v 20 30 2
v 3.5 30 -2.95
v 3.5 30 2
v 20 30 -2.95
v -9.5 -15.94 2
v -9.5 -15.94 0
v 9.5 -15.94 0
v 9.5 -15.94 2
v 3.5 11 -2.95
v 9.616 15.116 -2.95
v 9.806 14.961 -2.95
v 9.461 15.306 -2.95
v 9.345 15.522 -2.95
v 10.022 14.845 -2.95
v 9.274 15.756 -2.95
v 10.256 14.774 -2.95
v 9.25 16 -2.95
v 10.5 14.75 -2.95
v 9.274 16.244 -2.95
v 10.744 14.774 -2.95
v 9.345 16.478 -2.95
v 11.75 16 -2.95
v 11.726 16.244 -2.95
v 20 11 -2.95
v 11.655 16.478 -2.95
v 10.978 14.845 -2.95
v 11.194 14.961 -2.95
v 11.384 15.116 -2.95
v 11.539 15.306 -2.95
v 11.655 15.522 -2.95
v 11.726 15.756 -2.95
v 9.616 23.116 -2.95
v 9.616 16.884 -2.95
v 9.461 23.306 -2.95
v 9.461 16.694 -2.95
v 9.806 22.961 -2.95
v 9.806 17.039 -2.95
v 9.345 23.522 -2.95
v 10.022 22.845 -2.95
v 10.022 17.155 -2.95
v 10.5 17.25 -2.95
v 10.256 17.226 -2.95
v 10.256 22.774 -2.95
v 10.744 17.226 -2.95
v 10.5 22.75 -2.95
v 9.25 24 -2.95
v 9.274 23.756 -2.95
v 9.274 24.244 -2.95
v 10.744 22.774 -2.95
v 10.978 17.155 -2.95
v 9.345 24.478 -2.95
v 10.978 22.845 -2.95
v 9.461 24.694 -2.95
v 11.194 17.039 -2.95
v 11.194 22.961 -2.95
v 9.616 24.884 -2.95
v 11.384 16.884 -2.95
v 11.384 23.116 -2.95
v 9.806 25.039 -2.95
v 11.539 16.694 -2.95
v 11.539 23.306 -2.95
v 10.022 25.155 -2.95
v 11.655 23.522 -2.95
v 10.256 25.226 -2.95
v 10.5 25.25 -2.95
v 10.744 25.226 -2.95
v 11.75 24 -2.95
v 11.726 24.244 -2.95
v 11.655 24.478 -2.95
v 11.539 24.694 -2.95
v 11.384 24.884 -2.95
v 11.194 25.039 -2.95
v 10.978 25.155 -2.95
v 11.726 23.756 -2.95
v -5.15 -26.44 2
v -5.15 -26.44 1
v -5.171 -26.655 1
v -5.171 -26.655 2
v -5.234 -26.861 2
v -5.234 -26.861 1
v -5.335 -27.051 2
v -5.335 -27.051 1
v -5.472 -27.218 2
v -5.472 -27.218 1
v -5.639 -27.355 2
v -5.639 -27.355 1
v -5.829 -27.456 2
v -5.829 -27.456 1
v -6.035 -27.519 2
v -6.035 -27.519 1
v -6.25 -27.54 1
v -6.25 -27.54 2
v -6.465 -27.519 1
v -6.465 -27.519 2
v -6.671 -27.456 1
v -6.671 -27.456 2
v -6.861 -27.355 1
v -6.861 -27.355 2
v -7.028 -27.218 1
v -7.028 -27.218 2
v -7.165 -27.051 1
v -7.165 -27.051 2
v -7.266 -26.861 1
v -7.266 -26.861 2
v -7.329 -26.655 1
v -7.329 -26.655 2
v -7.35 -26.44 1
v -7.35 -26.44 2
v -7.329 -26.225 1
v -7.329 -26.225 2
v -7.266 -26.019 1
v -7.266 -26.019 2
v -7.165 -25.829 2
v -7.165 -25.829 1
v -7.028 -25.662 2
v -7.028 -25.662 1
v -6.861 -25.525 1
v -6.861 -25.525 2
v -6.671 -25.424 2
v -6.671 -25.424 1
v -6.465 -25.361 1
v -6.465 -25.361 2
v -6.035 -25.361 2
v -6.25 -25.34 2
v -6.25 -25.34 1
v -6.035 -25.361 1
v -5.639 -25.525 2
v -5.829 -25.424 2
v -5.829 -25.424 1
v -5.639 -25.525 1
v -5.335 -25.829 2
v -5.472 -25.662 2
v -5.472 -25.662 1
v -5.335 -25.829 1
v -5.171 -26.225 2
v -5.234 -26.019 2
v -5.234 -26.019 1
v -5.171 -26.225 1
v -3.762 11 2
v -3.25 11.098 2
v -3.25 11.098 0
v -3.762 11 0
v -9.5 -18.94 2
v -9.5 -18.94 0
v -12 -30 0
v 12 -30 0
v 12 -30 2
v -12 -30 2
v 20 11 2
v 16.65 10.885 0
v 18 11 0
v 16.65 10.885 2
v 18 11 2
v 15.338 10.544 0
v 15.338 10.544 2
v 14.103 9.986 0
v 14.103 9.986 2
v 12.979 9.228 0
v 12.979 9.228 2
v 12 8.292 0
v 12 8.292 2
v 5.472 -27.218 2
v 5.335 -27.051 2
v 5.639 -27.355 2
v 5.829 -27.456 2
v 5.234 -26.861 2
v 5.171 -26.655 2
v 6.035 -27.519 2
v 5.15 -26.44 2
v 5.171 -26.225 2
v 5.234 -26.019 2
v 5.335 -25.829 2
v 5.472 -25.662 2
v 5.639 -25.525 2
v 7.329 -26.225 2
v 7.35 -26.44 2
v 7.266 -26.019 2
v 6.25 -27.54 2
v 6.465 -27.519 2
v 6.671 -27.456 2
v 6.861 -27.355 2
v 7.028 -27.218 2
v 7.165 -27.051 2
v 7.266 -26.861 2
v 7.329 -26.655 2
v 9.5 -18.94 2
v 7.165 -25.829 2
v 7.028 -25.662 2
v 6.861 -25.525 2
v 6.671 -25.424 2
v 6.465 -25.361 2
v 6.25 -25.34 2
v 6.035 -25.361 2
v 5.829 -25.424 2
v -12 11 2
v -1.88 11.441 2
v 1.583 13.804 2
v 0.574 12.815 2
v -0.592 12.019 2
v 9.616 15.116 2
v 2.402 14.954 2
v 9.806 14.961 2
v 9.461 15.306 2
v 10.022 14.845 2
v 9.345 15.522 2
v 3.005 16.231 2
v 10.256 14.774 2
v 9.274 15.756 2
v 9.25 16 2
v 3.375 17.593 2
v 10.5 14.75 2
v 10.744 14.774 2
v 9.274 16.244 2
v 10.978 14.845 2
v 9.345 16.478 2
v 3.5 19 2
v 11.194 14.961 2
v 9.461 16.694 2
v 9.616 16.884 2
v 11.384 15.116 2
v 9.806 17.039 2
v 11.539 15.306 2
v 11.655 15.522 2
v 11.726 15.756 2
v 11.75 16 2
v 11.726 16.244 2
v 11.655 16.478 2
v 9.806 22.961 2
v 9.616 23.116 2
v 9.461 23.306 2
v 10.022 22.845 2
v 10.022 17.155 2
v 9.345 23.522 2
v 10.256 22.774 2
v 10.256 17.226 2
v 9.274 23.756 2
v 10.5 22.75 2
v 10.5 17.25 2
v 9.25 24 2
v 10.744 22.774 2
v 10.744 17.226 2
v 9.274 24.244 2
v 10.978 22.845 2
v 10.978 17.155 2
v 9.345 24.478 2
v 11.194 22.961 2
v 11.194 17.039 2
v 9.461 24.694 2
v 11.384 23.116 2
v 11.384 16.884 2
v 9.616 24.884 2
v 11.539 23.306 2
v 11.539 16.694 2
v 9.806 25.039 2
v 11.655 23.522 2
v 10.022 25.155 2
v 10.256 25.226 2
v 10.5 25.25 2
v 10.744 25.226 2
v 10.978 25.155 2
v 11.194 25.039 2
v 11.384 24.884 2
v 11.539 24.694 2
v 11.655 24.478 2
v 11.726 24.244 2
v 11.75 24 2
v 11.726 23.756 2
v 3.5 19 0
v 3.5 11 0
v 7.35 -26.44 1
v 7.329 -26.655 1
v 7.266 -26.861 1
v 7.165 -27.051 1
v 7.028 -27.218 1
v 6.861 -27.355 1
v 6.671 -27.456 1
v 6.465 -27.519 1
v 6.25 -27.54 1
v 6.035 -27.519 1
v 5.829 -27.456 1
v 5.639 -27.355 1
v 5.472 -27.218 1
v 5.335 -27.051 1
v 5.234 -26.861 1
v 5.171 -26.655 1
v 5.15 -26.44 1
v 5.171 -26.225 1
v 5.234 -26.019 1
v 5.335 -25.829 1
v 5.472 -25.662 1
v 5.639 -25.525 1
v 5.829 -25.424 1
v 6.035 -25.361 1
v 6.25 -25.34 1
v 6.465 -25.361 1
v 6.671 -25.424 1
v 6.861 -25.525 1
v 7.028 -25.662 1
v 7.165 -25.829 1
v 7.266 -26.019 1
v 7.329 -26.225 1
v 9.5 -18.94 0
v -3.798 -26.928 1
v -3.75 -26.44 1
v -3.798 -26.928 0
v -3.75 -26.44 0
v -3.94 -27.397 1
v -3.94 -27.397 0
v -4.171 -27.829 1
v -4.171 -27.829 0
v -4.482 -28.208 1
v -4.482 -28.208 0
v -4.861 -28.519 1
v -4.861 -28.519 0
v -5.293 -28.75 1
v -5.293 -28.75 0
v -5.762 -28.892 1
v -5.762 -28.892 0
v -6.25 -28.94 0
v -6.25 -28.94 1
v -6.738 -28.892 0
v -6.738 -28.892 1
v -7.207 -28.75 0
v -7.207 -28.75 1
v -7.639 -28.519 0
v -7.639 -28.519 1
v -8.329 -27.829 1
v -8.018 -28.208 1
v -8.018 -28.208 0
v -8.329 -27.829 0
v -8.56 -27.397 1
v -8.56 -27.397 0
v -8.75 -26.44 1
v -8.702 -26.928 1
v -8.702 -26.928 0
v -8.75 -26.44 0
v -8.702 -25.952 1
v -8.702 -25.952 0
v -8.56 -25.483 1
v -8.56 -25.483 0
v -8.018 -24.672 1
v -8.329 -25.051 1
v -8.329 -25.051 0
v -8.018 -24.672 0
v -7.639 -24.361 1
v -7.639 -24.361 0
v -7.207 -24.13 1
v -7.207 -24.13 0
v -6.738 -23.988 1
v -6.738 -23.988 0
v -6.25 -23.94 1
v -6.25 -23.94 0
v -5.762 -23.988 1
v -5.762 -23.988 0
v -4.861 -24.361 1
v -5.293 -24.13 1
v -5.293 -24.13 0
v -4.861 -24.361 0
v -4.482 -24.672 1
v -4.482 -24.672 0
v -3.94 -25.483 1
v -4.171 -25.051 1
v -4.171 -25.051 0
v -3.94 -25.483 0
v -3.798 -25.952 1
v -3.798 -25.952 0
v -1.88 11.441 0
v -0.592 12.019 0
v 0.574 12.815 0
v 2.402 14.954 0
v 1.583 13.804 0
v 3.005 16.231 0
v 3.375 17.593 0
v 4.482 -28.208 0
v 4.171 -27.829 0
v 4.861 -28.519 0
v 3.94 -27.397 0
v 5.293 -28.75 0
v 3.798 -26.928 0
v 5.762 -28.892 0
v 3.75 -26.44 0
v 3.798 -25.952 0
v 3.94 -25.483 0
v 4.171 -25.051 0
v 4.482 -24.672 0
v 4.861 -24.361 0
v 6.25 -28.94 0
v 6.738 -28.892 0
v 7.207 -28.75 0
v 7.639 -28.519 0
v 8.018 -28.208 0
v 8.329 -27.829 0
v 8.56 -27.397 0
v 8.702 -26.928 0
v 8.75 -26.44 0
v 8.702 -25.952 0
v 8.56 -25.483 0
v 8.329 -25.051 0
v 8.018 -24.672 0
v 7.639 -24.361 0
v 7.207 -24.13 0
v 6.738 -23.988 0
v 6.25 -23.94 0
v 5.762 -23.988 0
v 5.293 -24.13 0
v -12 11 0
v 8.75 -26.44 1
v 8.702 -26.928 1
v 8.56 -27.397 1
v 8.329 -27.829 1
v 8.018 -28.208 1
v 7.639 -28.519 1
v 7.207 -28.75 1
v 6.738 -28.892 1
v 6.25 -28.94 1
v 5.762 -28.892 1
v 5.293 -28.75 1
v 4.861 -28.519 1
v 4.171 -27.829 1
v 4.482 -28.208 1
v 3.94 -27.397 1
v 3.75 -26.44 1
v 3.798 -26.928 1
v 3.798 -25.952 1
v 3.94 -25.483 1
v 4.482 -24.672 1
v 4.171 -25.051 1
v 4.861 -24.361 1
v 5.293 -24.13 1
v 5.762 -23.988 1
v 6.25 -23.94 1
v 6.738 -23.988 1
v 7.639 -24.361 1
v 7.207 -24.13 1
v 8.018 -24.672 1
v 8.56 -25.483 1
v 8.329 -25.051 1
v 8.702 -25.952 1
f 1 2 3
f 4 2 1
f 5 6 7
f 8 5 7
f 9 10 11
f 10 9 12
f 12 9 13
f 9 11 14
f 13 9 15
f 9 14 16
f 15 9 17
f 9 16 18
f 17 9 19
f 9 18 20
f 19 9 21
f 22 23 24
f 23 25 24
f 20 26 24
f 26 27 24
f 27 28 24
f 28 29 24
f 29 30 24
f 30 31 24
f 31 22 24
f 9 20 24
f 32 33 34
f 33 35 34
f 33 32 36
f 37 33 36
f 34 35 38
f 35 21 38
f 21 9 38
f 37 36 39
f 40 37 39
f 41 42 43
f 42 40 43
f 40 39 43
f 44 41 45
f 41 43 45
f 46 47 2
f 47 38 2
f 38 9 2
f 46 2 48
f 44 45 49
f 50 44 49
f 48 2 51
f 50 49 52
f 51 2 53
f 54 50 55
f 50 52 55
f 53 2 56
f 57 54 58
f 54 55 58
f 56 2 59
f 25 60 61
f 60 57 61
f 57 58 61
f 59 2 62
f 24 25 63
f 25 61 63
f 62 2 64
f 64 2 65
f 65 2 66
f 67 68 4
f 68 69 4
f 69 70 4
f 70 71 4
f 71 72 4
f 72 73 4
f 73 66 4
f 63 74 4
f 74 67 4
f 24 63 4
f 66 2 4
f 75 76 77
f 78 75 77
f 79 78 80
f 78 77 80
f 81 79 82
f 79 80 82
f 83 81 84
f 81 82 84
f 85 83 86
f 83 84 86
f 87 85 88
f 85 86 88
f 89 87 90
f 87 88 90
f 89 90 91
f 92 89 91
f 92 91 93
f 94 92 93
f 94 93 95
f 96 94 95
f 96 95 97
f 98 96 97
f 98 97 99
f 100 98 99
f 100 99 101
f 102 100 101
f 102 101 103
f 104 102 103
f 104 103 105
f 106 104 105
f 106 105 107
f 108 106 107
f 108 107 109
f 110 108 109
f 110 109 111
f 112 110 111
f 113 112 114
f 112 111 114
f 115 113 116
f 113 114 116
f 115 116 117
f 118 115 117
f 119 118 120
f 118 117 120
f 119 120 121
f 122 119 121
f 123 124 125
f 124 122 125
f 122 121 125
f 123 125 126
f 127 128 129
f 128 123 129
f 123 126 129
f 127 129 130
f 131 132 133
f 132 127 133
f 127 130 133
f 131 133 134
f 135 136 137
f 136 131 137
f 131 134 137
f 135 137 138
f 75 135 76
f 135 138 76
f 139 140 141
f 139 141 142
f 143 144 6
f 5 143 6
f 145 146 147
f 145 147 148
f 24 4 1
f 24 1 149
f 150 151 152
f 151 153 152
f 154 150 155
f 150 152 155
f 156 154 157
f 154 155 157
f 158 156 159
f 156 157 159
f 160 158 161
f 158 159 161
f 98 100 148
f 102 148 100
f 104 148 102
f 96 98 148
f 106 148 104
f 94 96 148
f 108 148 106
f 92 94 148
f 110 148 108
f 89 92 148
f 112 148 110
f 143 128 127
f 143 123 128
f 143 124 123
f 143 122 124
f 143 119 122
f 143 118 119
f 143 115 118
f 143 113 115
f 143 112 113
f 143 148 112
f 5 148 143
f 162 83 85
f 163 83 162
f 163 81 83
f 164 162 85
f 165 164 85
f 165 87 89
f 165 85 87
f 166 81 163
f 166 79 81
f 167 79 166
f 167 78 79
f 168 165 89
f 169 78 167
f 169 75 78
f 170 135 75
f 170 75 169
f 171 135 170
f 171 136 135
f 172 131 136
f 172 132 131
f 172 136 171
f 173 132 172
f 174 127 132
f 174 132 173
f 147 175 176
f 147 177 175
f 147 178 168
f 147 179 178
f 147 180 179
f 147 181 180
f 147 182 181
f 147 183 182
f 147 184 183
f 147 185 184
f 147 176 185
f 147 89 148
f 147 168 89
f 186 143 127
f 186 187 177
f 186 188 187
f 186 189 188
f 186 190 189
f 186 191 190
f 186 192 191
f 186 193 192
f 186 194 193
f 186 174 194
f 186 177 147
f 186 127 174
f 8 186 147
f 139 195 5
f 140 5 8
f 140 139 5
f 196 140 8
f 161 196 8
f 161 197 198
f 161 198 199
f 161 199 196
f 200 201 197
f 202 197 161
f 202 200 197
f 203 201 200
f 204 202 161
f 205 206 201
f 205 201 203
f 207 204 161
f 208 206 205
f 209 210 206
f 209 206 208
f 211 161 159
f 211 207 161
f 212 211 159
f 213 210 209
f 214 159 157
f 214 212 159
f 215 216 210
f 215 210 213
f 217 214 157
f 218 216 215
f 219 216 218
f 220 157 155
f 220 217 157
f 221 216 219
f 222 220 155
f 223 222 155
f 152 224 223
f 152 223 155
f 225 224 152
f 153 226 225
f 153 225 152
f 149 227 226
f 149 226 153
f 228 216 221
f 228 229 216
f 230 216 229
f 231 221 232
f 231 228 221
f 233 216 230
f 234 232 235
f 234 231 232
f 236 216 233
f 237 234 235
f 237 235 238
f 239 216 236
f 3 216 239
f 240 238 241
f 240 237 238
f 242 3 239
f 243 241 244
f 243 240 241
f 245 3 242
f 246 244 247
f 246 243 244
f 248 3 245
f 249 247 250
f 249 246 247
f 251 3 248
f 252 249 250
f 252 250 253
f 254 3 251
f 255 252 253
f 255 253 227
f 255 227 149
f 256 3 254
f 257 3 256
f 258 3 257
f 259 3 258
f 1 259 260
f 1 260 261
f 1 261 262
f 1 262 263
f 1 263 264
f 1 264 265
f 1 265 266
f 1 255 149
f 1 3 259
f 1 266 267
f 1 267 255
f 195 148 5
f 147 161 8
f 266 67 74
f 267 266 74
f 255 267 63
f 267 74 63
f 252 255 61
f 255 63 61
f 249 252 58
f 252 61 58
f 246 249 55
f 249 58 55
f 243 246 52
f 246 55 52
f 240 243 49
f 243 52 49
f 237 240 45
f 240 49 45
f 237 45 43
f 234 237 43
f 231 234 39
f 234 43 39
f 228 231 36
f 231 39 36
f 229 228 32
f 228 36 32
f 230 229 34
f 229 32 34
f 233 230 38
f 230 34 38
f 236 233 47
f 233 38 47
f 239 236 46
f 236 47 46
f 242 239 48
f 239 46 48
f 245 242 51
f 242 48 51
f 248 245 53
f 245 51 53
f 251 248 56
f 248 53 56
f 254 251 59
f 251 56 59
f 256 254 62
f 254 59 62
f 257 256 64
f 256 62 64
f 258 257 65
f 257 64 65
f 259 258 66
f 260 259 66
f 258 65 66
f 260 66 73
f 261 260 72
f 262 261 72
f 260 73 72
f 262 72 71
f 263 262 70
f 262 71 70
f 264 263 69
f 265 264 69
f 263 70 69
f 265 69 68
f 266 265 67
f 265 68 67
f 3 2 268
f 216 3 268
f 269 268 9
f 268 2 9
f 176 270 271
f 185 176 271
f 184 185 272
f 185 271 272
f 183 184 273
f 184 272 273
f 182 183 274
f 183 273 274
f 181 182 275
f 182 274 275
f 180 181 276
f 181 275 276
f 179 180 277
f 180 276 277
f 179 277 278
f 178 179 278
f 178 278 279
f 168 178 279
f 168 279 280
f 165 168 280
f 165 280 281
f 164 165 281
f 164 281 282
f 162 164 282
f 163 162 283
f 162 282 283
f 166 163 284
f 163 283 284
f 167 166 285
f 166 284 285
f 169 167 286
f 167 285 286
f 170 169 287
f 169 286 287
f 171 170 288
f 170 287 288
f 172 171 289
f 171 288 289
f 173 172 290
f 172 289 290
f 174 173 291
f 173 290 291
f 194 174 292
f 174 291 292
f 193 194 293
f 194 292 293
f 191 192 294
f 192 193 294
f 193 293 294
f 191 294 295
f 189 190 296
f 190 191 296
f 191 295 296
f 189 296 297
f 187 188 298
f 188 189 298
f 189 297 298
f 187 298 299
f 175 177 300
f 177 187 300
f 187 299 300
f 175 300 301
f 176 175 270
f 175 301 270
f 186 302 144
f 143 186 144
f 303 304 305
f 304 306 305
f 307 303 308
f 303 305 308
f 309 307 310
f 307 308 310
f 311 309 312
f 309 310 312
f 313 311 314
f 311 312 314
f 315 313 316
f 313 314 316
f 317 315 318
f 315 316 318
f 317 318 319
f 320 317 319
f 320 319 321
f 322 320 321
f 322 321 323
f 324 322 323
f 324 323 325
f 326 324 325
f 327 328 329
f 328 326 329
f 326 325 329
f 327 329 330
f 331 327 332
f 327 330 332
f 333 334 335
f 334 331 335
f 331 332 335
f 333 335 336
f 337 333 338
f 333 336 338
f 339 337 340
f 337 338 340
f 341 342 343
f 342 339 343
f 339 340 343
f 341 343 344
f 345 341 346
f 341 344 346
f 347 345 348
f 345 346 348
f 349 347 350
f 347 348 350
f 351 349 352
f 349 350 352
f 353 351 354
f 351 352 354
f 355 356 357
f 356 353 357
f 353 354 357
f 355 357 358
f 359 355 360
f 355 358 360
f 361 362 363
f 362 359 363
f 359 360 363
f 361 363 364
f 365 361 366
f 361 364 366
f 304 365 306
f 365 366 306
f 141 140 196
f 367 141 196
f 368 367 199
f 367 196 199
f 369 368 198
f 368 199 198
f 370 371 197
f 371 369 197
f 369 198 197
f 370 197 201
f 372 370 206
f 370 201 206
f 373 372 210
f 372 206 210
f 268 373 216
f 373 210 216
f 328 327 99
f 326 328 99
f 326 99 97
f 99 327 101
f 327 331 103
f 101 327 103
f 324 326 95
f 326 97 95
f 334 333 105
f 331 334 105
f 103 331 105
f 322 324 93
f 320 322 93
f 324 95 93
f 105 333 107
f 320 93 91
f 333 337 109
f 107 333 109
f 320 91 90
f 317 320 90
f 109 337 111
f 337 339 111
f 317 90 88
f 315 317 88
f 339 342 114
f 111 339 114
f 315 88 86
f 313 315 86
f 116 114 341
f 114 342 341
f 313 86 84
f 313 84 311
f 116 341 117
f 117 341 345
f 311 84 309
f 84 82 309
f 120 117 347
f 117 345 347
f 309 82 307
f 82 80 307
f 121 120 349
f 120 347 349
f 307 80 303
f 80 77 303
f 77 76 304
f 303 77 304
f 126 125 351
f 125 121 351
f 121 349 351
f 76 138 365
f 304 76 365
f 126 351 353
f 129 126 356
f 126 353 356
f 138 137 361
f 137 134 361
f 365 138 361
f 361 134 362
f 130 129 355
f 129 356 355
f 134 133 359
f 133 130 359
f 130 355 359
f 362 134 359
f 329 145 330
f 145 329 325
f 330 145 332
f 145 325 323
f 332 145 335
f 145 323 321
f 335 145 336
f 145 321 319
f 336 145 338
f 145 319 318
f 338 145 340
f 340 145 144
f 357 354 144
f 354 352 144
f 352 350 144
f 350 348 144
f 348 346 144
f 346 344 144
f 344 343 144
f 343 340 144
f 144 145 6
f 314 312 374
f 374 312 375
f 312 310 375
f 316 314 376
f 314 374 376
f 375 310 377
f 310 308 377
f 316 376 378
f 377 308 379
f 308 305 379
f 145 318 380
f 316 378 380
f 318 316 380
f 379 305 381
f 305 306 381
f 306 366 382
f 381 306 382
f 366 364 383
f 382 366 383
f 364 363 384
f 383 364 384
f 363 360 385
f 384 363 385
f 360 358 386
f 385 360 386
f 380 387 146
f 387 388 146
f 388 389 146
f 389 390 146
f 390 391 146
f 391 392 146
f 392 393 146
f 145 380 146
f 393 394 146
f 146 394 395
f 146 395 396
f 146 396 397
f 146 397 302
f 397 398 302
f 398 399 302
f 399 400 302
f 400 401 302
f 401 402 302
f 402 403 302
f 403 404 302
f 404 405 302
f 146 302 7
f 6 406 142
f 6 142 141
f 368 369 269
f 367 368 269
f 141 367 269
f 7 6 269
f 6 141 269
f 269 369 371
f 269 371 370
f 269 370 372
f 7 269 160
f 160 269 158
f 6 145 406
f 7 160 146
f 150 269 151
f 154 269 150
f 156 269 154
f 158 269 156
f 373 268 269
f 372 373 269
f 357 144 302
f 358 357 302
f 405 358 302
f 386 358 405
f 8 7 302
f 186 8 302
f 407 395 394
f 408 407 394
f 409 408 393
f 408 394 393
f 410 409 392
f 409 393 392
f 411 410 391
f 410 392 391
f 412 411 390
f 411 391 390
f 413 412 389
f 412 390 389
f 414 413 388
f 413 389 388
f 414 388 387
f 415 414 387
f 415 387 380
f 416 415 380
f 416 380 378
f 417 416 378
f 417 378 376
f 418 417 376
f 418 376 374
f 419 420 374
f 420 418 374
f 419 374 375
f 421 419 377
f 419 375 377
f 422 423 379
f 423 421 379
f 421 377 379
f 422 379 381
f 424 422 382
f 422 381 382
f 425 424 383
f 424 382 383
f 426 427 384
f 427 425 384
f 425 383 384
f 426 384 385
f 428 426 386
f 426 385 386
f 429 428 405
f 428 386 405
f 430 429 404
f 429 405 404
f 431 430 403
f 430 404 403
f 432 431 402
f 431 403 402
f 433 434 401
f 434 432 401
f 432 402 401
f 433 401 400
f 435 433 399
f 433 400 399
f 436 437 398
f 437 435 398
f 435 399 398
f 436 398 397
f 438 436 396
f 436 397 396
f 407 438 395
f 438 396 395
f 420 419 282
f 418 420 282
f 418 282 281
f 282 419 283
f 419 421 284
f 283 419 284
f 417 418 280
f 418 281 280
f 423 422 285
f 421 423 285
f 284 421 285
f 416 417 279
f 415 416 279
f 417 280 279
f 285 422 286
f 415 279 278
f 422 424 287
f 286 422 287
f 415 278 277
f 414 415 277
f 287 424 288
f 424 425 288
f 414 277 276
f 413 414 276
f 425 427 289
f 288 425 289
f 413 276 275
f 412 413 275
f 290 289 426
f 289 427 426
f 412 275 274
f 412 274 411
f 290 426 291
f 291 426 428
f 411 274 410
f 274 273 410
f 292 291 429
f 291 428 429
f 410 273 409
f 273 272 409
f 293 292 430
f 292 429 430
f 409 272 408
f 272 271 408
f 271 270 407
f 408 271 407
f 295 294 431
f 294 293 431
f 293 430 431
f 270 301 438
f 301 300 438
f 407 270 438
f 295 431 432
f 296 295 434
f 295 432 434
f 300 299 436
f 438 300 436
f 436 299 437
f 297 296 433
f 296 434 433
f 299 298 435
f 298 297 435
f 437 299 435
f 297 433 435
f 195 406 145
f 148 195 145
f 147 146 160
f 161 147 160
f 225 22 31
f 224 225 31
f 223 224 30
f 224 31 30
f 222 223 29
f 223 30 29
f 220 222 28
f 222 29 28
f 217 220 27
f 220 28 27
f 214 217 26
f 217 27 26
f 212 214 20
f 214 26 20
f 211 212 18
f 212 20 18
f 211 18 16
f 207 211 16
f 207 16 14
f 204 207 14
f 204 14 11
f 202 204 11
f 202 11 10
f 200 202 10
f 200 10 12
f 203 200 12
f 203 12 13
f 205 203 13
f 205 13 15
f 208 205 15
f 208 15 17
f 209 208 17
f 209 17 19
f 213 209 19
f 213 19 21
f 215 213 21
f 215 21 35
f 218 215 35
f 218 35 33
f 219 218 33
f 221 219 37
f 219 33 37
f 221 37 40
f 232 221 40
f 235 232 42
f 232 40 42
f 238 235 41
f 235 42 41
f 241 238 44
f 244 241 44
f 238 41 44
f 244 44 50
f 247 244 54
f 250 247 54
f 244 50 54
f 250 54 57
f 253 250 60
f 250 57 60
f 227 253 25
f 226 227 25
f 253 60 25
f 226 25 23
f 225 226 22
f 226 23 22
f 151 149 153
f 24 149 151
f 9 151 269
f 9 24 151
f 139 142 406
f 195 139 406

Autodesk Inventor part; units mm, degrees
ref_plane "YZ Plane" through (0, 0, 0) normal (1, 0, 0) x (0, 1, 0)
ref_plane "XZ Plane" through (0, 0, 0) normal (0, 1, 0) x (-1, 0, 0)
ref_plane "XY Plane" through (0, 0, 0) normal (0, 0, 1) x (1, 0, 0)
sketch "スケッチ1" plane through (0, 0, 0) normal (0, 0, 1) x (1, 0, 0)
  line L0 (-10, 30) -> (10, 30)
  line L1 (10, 30) -> (10, -30)
  line L2 (10, -30) -> (-10, -30)
  line L3 (-10, -30) -> (-10, 30)
  line L4 (-10, 30) -> (10, -30) construction
  line L5 (10, 30) -> (-10, -30) construction
  line L6 (10, 30) -> (20, 30)
  line L7 (20, 30) -> (20, 11)
  line L8 (20, 11) -> (10, 11)
  line L9 (10.5, 30) -> (10.5, 11) construction
  circle A0 centre (10.5, 24) radius 1.25
  circle A1 centre (10.5, 16) radius 1.25
  line L10 (3.5, 30) -> (3.5, 11)
  line L11 (3.5, 11) -> (-10, 11)
  circle A2 centre (-6.25, -26.44) radius 1.1
  line L12 (-10, -26.44) -> (10, -26.44) construction
  circle A3 centre (6.25, -26.44) radius 1.1
  line L13 (0, -30) -> (0, 30) construction
  line L14 (-9.5, -15.94) -> (9.5, -15.94)
  line L15 (9.5, -15.94) -> (9.5, -18.94)
  line L16 (9.5, -18.94) -> (-9.5, -18.94)
  line L17 (-9.5, -18.94) -> (-9.5, -15.94)
  line L18 (-9.5, -15.94) -> (9.5, -18.94) construction
  line L19 (9.5, -15.94) -> (-9.5, -18.94) construction
  line L20 (10, 11) -> (3.5, 11)
  circle A4 centre (6.25, -26.44) radius 2.5
  circle A5 centre (-6.25, -26.44) radius 2.5
  line L21 (10, -30) -> (12, -30)
  line L22 (12, -30) -> (12, 11)
  line L23 (-10, 11) -> (-12, 11)
  line L24 (-12, 11) -> (-12, -30)
  line L25 (-12, -30) -> (-10, -30)
  point P0 (0, 0)
  point P1 (0, -17.44)
  dimension "d0" = 60
  dimension "d1" = 20
  dimension "d2" = 2.5
  dimension "d3" = 8
  dimension "d4" = 5
  dimension "d5" = 10.5
  dimension "d6" = 19
  dimension "d7" = 10
  dimension "d8" = 7
  dimension "d9" = 2.2
  dimension "d10" = 2.2
  dimension "d11" = 12.5
  dimension "d12" = 6.25
  dimension "d13" = 3.56
  dimension "d14" = 3
  dimension "d15" = 19
  dimension "d16" = 9
  dimension "d22" = 5
  dimension "d23" = 5
  dimension "d27" = 2
  dimension "d28" = 2
extrude "押し出し1" add sketch "スケッチ1" along normal blind 2 contours L0 L1 A0 A1 L20 L10 | L11 L20 L1 L2 L3 | L6 L7 L8 L1 A1 A0 | A4 | A5
extrude "押し出し2" add sketch "スケッチ1" against normal blind 2.95 contours L0 L1 A0 A1 L20 L10 | L6 L7 L8 L1 A1 A0
fillet "フィレット1" radius 8 2 edges at (10, 11, 1) (3.5, 11, 1)
extrude "押し出し3" cut sketch "スケッチ1" along normal blind 1 contours A4 | A5
fillet "フィレット2" radius 8 1 edges at (-10, 11, 1)
extrude "押し出し4" add sketch "スケッチ1" along normal up to surface (2 mm away) contours L11 L20 L1 L2 L3 | L3 L25 L24 L23 | L8 L22 L21 L1
properties part number "adapter_tof"
